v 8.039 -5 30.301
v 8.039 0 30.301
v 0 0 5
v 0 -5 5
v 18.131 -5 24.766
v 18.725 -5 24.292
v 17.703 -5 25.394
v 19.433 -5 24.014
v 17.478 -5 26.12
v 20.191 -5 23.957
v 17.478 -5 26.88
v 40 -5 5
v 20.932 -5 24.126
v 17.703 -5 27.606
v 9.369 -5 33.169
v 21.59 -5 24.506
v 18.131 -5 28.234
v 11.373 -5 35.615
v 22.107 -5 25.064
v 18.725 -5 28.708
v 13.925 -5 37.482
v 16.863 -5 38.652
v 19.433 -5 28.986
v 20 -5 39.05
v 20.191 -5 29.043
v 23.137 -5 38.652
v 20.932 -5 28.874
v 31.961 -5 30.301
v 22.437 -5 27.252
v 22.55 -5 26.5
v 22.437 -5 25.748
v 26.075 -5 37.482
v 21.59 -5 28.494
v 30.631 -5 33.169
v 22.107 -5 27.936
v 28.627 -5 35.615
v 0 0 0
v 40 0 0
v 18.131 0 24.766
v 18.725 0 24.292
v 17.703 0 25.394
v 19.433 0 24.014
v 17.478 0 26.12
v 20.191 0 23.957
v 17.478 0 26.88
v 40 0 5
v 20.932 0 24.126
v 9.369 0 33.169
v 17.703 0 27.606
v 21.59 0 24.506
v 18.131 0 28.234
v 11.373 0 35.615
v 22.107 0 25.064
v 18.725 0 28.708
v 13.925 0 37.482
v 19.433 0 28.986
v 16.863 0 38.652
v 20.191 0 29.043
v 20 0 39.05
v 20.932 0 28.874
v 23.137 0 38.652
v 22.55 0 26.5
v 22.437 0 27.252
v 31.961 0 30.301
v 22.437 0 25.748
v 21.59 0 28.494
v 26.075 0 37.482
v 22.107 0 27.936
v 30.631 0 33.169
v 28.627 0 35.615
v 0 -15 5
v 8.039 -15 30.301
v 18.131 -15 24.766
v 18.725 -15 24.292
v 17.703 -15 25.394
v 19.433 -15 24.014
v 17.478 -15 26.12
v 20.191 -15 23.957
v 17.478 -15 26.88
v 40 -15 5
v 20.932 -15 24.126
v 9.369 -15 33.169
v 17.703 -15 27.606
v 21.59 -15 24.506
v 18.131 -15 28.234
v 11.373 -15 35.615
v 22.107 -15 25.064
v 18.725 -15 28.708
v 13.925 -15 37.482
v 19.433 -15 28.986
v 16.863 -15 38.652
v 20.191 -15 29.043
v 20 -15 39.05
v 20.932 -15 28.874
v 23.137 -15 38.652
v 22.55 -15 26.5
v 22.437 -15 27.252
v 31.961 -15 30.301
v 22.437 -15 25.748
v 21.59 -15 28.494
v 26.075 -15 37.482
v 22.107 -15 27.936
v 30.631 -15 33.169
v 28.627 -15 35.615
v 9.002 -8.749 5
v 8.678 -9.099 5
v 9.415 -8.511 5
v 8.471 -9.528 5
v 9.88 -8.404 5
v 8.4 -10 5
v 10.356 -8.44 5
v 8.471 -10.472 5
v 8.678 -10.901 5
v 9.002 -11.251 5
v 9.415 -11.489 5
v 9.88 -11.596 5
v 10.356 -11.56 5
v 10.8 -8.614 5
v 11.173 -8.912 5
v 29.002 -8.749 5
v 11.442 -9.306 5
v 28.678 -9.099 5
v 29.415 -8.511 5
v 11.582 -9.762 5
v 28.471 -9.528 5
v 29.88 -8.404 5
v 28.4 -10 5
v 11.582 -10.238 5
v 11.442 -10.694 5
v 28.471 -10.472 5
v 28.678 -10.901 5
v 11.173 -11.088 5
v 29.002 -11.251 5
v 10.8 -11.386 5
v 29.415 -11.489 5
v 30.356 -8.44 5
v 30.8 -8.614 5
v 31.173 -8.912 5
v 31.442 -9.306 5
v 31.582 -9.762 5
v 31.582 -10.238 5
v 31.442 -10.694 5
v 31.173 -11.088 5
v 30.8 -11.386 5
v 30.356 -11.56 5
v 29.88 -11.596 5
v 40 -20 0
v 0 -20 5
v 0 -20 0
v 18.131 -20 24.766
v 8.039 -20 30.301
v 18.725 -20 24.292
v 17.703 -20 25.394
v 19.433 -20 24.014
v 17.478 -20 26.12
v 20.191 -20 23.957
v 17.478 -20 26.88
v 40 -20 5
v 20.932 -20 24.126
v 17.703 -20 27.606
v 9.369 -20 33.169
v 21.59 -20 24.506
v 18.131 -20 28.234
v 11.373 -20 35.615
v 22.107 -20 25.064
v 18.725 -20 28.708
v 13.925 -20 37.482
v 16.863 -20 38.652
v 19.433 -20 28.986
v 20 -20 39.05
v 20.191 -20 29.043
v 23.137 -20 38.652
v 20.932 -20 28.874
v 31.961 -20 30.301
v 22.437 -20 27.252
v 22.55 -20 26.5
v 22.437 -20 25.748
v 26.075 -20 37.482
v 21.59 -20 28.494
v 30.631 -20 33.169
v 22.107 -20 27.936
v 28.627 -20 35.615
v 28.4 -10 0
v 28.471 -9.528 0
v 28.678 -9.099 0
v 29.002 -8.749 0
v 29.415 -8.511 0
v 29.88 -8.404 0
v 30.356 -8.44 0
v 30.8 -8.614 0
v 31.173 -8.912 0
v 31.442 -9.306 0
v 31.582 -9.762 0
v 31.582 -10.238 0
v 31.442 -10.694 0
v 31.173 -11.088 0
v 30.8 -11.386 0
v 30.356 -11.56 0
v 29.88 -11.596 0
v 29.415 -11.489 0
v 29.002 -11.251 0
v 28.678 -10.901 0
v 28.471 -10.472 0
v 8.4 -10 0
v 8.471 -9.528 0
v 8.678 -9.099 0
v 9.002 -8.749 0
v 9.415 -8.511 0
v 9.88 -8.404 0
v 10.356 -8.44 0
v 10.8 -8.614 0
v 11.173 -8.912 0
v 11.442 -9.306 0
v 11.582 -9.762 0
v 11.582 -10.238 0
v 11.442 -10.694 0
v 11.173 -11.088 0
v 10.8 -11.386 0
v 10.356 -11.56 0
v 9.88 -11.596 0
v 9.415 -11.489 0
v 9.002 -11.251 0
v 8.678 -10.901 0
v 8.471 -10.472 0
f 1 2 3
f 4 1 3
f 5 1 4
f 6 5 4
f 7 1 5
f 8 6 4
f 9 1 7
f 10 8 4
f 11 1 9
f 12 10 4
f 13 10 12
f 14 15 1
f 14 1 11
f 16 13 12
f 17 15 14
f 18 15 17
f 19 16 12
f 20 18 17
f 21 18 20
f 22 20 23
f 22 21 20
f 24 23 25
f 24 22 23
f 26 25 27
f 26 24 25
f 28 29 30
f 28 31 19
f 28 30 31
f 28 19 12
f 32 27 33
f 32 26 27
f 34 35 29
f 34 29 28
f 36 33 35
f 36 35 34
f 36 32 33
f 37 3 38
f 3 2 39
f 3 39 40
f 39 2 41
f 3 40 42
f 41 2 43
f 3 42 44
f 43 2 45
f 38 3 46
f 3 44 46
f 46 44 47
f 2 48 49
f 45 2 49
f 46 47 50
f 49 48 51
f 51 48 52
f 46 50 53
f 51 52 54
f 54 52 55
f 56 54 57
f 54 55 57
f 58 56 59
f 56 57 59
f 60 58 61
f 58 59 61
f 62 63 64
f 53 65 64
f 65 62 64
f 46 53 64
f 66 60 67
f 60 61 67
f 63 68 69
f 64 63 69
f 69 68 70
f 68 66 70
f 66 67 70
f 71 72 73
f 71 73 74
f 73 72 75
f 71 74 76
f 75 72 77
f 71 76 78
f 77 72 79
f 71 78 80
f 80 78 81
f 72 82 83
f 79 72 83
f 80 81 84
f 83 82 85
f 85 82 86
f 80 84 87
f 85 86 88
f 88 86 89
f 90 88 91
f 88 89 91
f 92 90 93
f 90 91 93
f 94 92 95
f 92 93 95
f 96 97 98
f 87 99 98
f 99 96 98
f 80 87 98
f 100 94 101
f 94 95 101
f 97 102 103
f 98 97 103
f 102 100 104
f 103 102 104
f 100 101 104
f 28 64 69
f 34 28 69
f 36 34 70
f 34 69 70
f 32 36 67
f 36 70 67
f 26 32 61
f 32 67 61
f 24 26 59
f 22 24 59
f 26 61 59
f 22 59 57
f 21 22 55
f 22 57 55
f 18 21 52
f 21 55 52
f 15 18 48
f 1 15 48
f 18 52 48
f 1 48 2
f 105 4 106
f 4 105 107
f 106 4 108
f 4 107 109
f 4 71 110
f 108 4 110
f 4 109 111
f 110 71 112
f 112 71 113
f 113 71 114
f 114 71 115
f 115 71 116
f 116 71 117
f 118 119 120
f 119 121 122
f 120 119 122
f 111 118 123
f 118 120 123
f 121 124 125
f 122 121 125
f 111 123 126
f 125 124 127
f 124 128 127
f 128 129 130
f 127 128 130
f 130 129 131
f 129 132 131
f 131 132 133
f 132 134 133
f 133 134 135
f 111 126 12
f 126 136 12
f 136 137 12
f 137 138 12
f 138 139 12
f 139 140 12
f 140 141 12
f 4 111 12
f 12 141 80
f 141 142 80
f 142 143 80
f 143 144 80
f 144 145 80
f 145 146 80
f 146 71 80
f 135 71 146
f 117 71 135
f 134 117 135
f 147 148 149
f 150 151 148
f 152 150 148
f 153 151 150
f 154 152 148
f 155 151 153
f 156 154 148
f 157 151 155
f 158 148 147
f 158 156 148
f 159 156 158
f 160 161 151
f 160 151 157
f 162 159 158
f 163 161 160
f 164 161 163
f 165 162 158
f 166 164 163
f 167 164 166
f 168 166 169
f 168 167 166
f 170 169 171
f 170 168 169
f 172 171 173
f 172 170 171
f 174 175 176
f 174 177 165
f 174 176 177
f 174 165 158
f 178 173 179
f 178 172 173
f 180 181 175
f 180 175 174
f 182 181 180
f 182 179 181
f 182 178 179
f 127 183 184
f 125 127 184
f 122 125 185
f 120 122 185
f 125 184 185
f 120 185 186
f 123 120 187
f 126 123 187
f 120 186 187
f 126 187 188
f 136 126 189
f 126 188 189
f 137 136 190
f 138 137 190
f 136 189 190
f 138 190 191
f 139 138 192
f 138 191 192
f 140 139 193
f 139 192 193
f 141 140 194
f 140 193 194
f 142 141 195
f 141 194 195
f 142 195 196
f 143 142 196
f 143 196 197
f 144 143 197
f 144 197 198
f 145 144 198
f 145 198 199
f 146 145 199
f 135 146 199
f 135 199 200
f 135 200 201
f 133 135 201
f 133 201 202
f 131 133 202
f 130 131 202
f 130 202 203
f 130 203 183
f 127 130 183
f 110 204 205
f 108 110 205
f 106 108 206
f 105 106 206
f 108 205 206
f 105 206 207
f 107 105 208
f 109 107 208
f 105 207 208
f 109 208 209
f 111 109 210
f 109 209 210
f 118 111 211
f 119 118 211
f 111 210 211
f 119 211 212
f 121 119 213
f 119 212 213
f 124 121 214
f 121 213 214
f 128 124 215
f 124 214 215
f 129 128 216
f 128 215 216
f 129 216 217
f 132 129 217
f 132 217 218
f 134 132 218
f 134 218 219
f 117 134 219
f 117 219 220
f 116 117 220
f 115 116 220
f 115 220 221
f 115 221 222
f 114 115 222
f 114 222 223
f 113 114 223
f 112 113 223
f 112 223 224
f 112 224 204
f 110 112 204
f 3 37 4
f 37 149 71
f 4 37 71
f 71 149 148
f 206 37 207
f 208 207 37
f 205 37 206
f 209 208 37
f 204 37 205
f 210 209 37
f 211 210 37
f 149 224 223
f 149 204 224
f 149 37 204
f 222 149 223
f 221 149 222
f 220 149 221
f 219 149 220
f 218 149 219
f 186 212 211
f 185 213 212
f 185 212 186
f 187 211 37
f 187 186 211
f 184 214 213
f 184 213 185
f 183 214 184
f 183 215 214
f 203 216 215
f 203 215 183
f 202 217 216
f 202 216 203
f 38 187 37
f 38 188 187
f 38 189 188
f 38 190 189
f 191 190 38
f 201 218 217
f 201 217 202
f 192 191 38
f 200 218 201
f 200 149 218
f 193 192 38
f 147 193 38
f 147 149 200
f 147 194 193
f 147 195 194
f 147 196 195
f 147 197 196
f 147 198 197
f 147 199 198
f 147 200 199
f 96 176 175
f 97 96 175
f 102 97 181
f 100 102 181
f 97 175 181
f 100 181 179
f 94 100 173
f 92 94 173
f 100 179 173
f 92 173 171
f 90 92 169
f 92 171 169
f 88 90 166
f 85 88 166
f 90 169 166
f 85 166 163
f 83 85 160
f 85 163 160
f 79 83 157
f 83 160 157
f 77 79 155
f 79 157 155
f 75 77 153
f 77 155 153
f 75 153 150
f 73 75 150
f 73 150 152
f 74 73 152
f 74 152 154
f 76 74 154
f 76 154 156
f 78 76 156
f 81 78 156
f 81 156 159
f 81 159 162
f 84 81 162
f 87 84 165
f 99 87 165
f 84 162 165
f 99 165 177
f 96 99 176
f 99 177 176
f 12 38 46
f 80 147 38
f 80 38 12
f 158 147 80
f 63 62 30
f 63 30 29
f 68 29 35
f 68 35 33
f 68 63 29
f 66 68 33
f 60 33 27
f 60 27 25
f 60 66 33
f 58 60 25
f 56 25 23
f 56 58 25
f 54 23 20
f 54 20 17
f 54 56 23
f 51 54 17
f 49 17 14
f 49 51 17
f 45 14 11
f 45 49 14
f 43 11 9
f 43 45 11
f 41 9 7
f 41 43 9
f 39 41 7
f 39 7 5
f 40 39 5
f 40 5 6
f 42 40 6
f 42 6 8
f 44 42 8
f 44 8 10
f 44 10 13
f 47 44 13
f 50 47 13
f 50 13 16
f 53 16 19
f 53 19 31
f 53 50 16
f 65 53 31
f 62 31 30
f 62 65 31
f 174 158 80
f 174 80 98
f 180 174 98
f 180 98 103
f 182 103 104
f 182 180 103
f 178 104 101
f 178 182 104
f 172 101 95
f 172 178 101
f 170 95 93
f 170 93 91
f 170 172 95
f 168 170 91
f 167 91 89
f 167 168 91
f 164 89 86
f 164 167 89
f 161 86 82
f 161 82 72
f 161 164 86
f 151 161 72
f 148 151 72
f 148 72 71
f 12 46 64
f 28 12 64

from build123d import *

# Parameters (mm, degrees)
F3_R     = 2.55
F4_DEPTH = 5
F0_W     = 40
F0_H     = 5
F5_DEPTH = 5
F6_D     = 3.2


with BuildPart() as f4:
    # F3 (on Front) → F4 (new body)
    with BuildSketch(Plane.XZ):
        with BuildLine():
            Line((0, 5), (0, 0))
            Line((0, 0), (40, 0))
            Line((40, 0), (40, 5))
            Line((40, 5), (31.9607029074, 30.3005375883))
            ThreePointArc((31.9607029074, 30.3005375883), (20, 39.05), (8.0392970926, 30.3005375883))
            Line((8.0392970926, 30.3005375883), (0, 5))
        make_face()
        with Locations((20, 26.5)):
            Circle(F3_R, mode=Mode.SUBTRACT)
    extrude(amount=F4_DEPTH)

    # F0 (on face) → F5 (join)
    with BuildSketch(Plane.XZ.offset(5)):
        with Locations((20, 2.5)):
            Rectangle(F0_W, F0_H)
    extrude(amount=F5_DEPTH)

    # F1: F4 across face


with BuildPart() as f4_1:
    add(f4.part)
    add(f4.part.mirror(Plane(origin=(20, -10, 2.5), x_dir=(1, 0, 0), z_dir=(0, -1, 0))))

    # F6 (through all)
    with Locations(Plane.XY.offset(5)):
        with Locations((10, -10), (30, -10)):
            Hole(F6_D / 2)


solid = f4_1.part
